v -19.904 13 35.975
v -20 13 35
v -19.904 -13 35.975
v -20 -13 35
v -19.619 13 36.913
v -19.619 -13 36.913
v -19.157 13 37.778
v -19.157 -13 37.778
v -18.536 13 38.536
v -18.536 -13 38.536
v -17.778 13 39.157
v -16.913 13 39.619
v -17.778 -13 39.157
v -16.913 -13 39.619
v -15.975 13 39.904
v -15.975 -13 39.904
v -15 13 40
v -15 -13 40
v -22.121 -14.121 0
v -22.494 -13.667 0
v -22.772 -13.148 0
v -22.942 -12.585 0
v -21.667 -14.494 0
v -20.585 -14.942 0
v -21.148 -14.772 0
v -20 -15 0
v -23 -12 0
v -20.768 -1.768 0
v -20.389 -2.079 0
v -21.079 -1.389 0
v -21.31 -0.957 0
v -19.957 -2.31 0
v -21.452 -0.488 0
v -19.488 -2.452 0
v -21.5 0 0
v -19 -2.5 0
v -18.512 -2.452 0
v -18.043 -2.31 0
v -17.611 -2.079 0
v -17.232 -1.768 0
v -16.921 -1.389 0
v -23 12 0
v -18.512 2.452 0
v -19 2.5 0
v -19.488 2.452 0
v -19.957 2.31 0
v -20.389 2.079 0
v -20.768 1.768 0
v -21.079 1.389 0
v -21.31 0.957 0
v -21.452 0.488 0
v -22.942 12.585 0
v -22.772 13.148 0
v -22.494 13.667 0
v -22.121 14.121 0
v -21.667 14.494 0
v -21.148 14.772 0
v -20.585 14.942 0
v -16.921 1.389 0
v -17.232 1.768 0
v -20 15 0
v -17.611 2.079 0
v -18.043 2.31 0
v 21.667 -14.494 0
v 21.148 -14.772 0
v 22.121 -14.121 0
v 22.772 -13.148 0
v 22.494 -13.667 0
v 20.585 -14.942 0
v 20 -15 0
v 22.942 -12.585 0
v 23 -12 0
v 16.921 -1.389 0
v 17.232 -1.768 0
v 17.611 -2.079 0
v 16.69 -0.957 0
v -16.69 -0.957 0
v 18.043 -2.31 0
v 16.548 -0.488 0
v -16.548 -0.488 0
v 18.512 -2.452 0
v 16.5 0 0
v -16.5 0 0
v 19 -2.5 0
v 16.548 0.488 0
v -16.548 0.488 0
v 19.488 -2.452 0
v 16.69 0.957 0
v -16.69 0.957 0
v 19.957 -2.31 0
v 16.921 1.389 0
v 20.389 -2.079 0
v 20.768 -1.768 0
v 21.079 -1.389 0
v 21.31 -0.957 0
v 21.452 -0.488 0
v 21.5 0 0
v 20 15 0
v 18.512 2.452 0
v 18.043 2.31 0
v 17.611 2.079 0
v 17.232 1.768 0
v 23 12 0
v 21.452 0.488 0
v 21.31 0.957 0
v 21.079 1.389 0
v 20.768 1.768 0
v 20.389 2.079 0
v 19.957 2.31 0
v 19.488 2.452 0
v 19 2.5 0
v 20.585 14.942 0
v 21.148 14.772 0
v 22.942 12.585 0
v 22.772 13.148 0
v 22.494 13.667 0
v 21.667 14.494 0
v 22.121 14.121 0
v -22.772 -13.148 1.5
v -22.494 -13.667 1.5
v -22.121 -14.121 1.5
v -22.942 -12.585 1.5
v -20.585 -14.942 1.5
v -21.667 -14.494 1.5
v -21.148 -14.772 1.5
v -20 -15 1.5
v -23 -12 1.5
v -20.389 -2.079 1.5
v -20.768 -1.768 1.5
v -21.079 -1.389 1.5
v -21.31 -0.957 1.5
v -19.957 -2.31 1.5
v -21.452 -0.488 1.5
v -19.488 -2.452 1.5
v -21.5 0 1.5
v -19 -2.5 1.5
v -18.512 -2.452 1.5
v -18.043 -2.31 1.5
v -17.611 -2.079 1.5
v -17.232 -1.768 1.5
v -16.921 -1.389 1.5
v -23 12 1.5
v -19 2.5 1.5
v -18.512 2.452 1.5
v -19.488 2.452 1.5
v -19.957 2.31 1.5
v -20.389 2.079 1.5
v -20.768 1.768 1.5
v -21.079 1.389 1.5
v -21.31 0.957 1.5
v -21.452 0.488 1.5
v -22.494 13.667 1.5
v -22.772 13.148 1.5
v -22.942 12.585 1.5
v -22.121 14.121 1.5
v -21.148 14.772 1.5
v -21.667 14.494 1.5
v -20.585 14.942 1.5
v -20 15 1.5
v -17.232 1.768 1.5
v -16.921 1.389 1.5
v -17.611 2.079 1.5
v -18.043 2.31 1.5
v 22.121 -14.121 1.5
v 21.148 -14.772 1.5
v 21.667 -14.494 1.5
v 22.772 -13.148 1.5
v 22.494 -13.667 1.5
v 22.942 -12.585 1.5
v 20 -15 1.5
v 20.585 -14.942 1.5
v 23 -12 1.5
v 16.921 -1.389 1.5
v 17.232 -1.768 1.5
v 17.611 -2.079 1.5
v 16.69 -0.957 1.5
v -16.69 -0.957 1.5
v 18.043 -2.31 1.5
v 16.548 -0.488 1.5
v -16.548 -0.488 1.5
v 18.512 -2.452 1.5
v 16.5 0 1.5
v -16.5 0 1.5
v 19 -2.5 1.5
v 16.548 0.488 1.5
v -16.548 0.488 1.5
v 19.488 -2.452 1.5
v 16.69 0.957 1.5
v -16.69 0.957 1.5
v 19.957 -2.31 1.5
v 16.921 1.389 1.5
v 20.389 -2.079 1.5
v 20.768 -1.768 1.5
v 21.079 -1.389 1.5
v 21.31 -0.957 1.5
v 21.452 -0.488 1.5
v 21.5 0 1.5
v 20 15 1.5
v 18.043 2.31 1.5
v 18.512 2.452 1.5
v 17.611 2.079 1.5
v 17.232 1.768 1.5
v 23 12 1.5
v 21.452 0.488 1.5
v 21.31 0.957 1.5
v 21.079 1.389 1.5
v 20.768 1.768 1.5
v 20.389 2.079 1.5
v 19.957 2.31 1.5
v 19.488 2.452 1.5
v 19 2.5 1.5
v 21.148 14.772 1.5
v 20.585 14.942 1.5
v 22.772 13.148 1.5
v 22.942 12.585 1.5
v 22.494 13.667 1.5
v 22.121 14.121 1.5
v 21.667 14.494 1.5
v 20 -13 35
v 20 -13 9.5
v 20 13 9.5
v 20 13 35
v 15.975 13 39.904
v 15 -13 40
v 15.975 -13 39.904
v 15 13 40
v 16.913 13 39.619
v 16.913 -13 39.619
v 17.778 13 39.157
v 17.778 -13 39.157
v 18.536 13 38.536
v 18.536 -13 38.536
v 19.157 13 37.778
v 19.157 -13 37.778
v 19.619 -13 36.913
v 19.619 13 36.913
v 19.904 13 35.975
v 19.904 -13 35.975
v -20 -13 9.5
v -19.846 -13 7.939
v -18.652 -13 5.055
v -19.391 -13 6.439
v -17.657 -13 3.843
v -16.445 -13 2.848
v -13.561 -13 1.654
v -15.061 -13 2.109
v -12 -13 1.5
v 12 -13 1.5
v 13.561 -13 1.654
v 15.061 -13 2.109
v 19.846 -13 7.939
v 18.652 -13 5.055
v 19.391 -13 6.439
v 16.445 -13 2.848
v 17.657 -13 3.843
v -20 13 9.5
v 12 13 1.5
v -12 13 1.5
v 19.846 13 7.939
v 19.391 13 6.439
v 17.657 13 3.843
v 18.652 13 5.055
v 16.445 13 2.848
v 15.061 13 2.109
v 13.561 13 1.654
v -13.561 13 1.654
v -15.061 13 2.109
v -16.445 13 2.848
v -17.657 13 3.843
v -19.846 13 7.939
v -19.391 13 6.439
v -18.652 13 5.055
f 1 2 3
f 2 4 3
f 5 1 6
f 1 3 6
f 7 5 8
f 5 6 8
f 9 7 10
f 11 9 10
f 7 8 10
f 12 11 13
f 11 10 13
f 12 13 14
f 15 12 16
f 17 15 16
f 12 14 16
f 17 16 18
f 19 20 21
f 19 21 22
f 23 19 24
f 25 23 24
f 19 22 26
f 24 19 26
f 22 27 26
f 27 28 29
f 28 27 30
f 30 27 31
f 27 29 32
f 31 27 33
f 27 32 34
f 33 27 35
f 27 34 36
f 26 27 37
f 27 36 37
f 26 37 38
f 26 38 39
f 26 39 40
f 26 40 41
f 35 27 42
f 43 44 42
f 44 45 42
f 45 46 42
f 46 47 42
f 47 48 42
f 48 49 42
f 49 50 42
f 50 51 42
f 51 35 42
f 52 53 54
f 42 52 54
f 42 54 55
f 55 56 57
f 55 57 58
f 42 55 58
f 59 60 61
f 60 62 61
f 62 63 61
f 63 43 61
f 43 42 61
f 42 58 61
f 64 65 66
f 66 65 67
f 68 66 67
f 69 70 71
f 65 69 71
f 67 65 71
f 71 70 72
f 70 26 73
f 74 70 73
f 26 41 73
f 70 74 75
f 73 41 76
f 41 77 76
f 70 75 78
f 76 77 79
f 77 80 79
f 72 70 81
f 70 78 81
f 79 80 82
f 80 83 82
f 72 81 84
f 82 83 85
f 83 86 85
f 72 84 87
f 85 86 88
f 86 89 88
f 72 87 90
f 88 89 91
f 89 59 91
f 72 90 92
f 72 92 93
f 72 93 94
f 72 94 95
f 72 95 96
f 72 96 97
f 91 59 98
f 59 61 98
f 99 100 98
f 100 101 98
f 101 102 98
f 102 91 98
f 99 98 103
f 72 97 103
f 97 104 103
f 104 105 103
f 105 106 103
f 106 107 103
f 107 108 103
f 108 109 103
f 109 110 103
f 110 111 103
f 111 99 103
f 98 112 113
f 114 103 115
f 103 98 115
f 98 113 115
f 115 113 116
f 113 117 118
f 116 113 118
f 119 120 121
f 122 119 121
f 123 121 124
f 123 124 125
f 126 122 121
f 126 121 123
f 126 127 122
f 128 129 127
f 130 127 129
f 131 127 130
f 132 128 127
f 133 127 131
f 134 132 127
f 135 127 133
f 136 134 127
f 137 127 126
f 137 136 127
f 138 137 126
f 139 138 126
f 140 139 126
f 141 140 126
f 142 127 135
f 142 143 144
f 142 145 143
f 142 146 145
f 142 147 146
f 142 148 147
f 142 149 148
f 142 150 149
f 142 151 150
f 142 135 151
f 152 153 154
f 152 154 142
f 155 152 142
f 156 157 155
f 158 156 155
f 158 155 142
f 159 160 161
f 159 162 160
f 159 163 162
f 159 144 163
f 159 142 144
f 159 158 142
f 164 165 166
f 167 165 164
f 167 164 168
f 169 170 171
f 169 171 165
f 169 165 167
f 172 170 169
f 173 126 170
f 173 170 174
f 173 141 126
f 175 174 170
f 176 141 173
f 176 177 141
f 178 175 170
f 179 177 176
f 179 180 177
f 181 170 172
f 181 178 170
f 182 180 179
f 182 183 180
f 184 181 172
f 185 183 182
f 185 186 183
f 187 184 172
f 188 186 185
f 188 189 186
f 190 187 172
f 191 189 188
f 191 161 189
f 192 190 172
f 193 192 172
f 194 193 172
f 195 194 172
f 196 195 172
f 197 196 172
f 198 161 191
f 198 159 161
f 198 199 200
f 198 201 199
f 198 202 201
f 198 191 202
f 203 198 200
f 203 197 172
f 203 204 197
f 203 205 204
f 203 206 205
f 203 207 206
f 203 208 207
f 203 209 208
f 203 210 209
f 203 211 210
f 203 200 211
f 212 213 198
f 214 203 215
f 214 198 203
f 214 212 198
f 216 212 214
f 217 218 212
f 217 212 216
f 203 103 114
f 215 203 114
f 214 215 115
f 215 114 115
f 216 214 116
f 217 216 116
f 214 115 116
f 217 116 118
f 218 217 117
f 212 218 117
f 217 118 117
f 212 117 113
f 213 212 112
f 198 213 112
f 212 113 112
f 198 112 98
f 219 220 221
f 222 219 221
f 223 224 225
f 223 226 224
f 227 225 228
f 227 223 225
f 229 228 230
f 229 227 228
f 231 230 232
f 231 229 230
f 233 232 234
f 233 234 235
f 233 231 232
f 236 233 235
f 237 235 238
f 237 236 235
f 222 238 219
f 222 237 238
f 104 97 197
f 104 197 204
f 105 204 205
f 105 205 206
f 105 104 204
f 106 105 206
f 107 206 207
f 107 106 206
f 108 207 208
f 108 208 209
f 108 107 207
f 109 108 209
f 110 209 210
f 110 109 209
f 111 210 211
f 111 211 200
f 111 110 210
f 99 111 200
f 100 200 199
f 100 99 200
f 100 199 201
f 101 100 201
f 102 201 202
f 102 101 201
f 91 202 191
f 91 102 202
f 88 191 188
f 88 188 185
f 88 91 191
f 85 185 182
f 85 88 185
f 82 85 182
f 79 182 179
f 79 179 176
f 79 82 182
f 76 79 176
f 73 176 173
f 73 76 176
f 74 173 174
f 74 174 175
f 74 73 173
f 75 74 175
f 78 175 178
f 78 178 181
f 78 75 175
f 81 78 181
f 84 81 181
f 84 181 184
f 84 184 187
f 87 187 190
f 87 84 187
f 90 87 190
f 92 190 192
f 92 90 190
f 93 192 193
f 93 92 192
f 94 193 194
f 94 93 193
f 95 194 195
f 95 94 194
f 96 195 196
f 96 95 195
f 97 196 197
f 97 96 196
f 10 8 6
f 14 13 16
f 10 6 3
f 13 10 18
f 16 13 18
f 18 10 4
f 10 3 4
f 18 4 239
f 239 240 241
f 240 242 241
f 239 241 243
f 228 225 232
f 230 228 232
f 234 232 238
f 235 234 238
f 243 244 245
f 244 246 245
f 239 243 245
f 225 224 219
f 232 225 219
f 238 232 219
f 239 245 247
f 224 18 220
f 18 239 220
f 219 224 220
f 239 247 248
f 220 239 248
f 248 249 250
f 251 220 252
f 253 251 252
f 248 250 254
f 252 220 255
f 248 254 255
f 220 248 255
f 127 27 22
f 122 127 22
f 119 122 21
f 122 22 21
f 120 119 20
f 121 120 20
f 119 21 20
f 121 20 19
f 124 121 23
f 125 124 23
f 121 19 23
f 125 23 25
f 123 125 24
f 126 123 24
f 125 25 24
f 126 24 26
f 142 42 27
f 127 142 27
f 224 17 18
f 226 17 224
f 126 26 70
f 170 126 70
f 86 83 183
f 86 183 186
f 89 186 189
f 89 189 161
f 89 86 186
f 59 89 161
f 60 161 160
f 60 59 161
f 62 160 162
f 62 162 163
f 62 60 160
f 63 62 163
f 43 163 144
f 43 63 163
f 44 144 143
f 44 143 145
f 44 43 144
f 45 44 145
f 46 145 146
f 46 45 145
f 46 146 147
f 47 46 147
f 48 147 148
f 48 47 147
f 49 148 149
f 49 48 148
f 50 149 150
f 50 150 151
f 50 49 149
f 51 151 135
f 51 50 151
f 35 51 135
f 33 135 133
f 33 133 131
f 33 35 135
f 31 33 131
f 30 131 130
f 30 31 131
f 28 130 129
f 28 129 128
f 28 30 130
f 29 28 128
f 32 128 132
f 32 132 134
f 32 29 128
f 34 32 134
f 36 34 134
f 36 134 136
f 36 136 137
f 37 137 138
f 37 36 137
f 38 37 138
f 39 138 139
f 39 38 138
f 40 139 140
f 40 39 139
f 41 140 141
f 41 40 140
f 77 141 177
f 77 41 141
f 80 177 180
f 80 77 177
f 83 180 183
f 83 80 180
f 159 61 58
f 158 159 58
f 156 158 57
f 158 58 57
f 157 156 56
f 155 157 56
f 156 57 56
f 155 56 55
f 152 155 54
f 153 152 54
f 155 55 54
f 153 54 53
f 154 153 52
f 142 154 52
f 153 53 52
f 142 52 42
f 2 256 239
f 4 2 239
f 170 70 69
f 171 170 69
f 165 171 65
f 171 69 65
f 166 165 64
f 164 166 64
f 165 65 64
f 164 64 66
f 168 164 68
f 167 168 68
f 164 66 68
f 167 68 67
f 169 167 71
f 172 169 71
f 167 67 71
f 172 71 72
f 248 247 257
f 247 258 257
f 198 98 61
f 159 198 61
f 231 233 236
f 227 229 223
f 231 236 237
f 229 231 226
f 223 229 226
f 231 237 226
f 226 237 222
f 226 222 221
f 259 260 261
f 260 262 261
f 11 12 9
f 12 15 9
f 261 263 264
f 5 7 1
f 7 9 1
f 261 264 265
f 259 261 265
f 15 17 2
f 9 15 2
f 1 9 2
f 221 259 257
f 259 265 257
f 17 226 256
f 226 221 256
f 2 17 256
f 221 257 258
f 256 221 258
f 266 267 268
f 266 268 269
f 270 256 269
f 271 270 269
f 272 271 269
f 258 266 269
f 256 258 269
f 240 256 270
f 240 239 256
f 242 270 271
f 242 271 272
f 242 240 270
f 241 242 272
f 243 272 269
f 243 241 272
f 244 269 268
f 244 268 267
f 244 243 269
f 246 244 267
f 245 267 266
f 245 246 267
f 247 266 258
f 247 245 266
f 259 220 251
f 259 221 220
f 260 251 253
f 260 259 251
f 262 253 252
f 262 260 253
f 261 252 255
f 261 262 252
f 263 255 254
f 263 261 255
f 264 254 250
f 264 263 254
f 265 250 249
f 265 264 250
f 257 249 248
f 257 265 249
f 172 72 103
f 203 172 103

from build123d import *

# Parameters (mm, degrees)
F0_R     = 2.5
F1_DEPTH = 1.5
F3_DEPTH = 38.5
F4_R     = 8
F5_R     = 5


with BuildPart() as f1:
    # F0 (on Top) → F1 (new body)
    with BuildSketch(Plane.XY):
        with BuildLine():
            Line((-20, -15), (20, -15))
            ThreePointArc((20, -15), (22.12132, -14.12132), (23, -12))
            Line((23, -12), (23, 12))
            ThreePointArc((23, 12), (22.12132, 14.12132), (20, 15))
            Line((20, 15), (-20, 15))
            ThreePointArc((-20, 15), (-22.12132, 14.12132), (-23, 12))
            Line((-23, 12), (-23, -12))
            ThreePointArc((-23, -12), (-22.12132, -14.12132), (-20, -15))
        make_face()
        with Locations((-19, 0)):
            Circle(F0_R, mode=Mode.SUBTRACT)
        with Locations((19, 0)):
            Circle(F0_R, mode=Mode.SUBTRACT)
    extrude(amount=F1_DEPTH)


with BuildPart() as f3:
    # F2 (on face) → F3 (new body)
    with BuildSketch(Plane.XY.offset(1.5)):
        with BuildLine():
            Line((-20, -13), (20, -13))
            Line((20, -13), (20, -2.291288))
            ThreePointArc((20, -2.291288), (16.5, 0), (20, 2.291288))
            Line((20, 2.291288), (20, 13))
            Line((20, 13), (-20, 13))
            Line((-20, 13), (-20, 2.291288))
            ThreePointArc((-20, 2.291288), (-17.630694, 2.09165), (-16.5, 0))
            ThreePointArc((-16.5, 0), (-17.630694, -2.09165), (-20, -2.291288))
            Line((-20, -2.291288), (-20, -13))
        make_face()
        with BuildLine():
            Line((-20, 2.291288), (-20, -2.291288))
            ThreePointArc((-20, -2.291288), (-17.630694, -2.09165), (-16.5, 0))
            ThreePointArc((-16.5, 0), (-17.630694, 2.09165), (-20, 2.291288))
        make_face()
        with BuildLine():
            ThreePointArc((20, 2.291288), (16.5, 0), (20, -2.291288))
            Line((20, -2.291288), (20, 2.291288))
        make_face()
    extrude(amount=F3_DEPTH)

    # F4
    f4_edges = [f3.edges().sort_by_distance(p)[0] for p in [
        (-20, 0, 1.5),
        (20, 0, 1.5),
    ]]
    fillet(f4_edges, radius=F4_R)

    # F5
    f5_edges = [f3.edges().sort_by_distance(p)[0] for p in [
        (-20, 0, 40),
        (20, 0, 40),
    ]]
    fillet(f5_edges, radius=F5_R)


solid = Compound([f1.part, f3.part])
